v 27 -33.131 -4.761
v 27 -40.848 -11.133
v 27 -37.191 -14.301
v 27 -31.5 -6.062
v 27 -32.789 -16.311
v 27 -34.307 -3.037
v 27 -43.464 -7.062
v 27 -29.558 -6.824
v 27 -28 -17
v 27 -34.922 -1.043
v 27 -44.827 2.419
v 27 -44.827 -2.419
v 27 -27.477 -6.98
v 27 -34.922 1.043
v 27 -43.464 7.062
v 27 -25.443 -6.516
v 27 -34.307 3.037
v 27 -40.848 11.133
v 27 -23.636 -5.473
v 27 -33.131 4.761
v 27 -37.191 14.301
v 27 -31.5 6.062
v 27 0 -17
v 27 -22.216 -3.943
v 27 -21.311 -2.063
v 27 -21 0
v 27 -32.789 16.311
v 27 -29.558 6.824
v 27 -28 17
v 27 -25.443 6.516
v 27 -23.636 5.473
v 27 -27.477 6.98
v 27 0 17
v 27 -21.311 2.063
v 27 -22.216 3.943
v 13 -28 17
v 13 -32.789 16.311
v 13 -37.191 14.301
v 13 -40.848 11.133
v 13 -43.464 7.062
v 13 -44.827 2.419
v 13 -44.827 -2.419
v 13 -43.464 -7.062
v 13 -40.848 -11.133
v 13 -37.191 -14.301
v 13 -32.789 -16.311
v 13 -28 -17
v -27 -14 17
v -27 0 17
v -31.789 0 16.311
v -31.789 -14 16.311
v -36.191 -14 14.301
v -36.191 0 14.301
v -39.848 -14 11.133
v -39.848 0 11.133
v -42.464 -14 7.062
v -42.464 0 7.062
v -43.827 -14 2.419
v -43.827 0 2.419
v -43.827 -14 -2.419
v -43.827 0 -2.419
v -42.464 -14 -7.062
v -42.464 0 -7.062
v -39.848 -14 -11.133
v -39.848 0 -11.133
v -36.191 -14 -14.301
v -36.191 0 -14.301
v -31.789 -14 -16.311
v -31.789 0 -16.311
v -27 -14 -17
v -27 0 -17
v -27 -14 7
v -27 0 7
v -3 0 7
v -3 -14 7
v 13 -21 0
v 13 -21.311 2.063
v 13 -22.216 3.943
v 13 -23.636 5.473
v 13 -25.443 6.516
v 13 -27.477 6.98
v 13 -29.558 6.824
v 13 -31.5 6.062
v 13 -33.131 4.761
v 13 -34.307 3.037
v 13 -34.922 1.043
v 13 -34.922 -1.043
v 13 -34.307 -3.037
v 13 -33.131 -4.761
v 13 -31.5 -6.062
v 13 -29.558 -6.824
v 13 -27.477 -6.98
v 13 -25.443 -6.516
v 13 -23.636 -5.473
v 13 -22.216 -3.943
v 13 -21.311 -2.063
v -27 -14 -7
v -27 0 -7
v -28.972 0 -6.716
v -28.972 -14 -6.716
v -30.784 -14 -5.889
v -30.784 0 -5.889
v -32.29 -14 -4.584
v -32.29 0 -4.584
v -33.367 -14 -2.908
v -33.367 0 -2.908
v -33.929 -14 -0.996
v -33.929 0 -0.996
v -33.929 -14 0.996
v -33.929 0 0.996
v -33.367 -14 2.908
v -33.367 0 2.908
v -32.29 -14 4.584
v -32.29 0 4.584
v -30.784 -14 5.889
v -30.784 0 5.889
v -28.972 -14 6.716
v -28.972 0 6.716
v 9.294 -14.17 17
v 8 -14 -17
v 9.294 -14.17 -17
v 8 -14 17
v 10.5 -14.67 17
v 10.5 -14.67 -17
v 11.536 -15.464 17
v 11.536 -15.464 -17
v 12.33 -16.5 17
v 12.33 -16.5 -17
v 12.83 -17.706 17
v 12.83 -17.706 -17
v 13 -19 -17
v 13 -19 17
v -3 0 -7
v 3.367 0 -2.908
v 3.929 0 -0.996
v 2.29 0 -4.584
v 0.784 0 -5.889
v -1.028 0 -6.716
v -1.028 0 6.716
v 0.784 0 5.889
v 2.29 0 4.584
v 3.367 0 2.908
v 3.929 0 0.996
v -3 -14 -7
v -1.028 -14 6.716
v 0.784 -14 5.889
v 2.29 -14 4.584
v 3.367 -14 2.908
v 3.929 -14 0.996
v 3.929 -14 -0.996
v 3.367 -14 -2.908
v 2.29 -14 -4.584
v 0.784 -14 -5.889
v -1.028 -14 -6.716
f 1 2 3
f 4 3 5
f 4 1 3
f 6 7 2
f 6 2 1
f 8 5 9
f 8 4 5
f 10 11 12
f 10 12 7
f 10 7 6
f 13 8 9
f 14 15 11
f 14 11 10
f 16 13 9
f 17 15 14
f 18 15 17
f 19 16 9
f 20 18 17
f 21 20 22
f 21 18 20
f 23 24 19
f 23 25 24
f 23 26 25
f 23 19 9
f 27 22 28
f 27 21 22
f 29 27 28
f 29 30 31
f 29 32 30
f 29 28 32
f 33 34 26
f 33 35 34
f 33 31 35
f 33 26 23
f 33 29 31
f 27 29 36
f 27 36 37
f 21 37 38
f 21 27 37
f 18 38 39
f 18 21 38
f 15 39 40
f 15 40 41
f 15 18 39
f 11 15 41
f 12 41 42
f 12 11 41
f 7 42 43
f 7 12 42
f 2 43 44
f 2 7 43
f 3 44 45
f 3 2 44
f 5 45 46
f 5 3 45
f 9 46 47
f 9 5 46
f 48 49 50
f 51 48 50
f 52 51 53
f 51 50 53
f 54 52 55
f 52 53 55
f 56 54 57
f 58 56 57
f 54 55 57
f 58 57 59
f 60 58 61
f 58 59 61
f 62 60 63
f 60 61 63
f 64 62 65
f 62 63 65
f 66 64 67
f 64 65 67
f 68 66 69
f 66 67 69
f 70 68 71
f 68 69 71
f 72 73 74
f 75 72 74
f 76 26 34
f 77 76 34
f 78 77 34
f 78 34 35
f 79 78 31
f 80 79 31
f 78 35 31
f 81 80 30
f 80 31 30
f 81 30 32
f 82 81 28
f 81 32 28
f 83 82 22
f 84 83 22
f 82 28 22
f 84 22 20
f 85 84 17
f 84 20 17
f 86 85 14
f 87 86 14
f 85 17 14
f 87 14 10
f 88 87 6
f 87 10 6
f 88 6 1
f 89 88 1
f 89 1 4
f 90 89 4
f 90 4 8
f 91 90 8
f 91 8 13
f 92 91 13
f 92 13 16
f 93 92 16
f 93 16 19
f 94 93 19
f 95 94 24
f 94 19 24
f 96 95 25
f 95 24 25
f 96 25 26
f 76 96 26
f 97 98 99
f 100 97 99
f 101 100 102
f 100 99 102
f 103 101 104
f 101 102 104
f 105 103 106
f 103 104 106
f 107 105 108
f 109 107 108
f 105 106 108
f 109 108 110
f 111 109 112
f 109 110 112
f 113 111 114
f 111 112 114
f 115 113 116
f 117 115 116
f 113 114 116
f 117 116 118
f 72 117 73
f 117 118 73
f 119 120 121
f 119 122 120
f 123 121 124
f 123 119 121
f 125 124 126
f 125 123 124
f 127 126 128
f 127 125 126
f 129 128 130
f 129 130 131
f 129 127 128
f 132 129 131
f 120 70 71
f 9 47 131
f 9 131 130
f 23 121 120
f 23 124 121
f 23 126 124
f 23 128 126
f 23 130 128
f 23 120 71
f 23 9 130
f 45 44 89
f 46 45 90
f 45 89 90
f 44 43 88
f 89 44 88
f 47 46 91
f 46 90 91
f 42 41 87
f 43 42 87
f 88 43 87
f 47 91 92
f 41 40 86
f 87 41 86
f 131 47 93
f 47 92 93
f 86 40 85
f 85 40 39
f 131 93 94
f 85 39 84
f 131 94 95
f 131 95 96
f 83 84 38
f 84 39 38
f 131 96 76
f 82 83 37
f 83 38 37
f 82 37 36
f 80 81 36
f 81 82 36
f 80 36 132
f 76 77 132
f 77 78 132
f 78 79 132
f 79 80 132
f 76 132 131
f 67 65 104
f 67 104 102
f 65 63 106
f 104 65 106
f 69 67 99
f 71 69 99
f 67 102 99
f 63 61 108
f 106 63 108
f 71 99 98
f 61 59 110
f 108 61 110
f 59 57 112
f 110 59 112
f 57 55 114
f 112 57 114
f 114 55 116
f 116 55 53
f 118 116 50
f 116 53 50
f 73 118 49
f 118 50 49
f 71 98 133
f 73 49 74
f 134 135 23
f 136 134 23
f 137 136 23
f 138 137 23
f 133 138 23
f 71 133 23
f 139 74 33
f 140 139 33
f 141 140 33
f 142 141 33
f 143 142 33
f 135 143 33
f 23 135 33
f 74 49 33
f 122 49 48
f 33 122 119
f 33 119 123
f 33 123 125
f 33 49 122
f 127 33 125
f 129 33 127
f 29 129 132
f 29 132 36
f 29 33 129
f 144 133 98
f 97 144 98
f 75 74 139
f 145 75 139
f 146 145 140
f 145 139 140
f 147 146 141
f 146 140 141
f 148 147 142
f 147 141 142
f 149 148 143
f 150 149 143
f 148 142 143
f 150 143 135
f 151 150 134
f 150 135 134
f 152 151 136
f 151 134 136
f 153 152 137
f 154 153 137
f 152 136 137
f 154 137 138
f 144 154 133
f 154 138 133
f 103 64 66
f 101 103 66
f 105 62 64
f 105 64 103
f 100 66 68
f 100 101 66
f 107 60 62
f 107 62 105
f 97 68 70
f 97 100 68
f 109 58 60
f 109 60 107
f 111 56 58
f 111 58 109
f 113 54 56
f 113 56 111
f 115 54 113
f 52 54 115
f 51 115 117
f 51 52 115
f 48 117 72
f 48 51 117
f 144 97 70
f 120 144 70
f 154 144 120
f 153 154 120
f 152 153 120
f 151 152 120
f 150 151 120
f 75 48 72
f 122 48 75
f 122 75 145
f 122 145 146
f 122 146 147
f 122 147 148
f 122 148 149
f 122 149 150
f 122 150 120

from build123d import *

# Parameters (mm, degrees)
F1_DEPTH = 14
F2_R     = 7
F3_DEPTH = 14
F4_R     = 5


with BuildPart() as f1:
    # F0 (on Front) → F1 (new body)
    with BuildSketch(Plane.XZ):
        with BuildLine():
            Line((27, 17), (-27, 17))
            ThreePointArc((-27, 17), (-44, 0), (-27, -17))
            Line((-27, -17), (27, -17))
            Line((27, -17), (27, 17))
        make_face()
        with BuildLine():
            Line((-3, -7), (-27, -7))
            ThreePointArc((-27, -7), (-34, 0), (-27, 7))
            Line((-27, 7), (-3, 7))
            ThreePointArc((-3, 7), (4, 0), (-3, -7))
        make_face(mode=Mode.SUBTRACT)
    extrude(amount=F1_DEPTH)

    # F2 (on face) → F3 (join)
    with BuildSketch(Plane.YZ.offset(27)):
        with BuildLine():
            Line((-28, -17), (0, -17))
            Line((0, -17), (0, 17))
            Line((0, 17), (-28, 17))
            ThreePointArc((-28, 17), (-45, 0), (-28, -17))
        make_face()
        with Locations((-28, 0)):
            Circle(F2_R, mode=Mode.SUBTRACT)
    extrude(amount=-F3_DEPTH)

    # F4
    f4_edges = [f1.edges().sort_by_distance(p)[0] for p in [
        (13, -14, 0),
    ]]
    fillet(f4_edges, radius=F4_R)


solid = f1.part
